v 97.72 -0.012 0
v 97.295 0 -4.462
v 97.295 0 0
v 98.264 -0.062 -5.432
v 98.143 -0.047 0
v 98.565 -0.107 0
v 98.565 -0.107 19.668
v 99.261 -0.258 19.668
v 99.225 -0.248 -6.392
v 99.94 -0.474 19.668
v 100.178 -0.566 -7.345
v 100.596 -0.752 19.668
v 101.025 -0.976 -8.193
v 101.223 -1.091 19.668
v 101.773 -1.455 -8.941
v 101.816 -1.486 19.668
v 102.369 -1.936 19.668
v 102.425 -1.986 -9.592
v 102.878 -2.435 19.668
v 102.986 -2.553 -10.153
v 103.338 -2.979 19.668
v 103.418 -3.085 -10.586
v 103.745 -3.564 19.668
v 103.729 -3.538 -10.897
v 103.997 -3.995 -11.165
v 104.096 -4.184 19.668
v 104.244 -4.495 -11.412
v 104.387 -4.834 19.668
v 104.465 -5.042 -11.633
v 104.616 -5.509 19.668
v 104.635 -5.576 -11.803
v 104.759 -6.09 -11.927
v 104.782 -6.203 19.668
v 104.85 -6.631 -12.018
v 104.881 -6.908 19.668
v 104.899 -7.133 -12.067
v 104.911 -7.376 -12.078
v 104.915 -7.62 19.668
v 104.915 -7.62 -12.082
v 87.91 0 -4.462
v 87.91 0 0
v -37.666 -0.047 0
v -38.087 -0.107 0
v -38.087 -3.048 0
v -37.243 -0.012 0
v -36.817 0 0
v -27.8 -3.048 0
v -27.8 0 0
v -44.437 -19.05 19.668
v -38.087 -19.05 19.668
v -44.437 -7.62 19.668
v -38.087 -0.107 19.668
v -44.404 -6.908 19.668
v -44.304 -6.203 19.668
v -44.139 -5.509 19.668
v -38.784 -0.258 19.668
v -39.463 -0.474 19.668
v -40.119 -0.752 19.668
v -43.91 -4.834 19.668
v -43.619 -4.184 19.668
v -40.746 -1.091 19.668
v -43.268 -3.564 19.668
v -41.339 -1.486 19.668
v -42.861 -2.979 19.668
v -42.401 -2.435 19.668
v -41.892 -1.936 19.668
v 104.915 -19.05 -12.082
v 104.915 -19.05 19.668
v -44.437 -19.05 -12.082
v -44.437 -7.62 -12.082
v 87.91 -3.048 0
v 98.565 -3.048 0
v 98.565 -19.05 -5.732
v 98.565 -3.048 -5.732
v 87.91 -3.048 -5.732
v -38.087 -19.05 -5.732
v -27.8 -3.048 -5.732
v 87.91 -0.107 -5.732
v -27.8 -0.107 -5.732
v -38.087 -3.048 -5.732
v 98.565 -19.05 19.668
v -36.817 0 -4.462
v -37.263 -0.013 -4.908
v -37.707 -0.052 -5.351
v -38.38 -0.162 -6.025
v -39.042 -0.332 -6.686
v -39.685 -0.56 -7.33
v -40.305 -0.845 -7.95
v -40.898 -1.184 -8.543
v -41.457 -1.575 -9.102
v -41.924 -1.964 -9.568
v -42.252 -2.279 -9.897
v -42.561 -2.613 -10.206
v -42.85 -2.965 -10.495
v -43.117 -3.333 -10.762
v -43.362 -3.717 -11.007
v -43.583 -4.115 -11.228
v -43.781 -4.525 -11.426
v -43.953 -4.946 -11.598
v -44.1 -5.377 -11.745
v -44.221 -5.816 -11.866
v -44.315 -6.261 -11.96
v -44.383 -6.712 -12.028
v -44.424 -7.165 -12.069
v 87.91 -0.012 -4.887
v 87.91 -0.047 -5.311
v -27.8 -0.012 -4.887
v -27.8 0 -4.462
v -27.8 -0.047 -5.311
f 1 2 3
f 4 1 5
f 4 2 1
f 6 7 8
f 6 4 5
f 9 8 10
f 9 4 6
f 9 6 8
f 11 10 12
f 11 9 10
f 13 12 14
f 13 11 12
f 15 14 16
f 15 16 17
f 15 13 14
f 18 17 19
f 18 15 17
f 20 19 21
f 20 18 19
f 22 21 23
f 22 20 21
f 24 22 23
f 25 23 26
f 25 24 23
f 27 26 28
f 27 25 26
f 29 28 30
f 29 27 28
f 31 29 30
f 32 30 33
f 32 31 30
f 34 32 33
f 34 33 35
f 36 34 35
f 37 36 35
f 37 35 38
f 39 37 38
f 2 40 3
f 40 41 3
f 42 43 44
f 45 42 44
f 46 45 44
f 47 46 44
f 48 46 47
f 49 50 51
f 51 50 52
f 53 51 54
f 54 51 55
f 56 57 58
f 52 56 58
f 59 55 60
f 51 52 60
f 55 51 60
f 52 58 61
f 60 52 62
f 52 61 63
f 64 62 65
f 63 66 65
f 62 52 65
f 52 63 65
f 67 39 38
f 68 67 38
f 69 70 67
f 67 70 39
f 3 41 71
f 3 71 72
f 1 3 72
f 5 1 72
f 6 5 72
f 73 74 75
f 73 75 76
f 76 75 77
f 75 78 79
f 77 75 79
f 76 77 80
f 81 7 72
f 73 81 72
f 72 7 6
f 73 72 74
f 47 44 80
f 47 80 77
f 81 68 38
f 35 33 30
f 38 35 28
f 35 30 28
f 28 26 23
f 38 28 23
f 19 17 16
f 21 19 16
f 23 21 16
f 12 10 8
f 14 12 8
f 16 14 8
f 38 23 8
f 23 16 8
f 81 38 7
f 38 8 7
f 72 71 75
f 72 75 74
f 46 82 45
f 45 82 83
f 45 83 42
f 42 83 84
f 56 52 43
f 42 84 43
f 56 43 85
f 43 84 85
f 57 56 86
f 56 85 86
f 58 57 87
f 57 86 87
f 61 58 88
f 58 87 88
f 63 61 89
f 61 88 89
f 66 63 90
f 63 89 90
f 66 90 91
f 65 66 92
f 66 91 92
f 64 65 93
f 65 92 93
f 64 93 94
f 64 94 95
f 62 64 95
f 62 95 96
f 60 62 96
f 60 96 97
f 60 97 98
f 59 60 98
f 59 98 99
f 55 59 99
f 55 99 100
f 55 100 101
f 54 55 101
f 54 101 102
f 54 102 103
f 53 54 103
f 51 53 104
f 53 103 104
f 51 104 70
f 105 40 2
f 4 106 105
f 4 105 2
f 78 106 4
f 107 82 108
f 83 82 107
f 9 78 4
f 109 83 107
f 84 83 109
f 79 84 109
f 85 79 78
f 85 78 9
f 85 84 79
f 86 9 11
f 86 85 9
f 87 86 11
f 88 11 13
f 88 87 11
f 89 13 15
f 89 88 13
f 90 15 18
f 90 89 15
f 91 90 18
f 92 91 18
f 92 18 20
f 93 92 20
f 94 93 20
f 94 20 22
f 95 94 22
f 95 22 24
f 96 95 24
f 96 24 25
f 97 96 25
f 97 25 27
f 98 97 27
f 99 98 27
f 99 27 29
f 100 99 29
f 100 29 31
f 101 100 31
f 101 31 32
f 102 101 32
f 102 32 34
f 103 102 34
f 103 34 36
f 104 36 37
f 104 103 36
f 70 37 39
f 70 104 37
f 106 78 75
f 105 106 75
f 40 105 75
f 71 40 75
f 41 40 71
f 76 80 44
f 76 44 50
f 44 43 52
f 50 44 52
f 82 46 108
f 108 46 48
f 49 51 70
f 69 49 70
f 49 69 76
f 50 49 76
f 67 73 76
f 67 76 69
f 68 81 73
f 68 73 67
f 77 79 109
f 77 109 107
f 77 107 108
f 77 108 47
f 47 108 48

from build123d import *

# Parameters (mm, degrees)
F1_DEPTH    = 19.05
F2_W        = 10.287
F2_H        = 5.9704589657
F2_W_2      = 10.7644796371
F3_DEPTH    = 3.048
F4_T1_DEPTH = 69.8499994576
F4_T3_DEPTH = 187.4519989152


# Not quite as in the source:
# - a fillet or chamfer that OpenCascade refuses, or shapes differently, is made with other operations: its cross-section is extruded or revolved along the edge and cut away or added


with BuildPart() as f1:
    # F0 (on Front) → F1 (new body)
    with BuildSketch(Plane.XZ):
        Polygon((-38.0874201655, -5.7323638652), (-38.0874201655, 19.6676361348), (-44.4374196231, 19.6676361348), (-44.4374196231, -12.0823633227), (104.9145792921, -12.0823633227), (104.9145792921, 19.6676361348), (98.5645798345, 19.6676361348), (98.5645798345, -5.7323638652), align=None)
    extrude(amount=F1_DEPTH)

    # F2 (on Front) → F3 (join)
    with BuildSketch(Plane.XZ):
        with Locations((-32.9439201655, -2.9852294829)):
            Rectangle(F2_W, F2_H)
        with Locations((93.29213202, -2.9852294829)):
            Rectangle(F2_W_2, F2_H)
    extrude(amount=F3_DEPTH)

    # F4: fillet of radius 7.62 on 3 edges, made by hand

    # F4_s2 → F4_t1 (cut)
    with BuildSketch(Plane.XY.offset(-31.1323633227)):
        with BuildLine():
            ThreePointArc((97.2945792921, 0), (102.6827329647, -2.2318463274), (104.9145792921, -7.62))
            Line((104.9145792921, -7.62), (104.9145792921, 0))
            Line((104.9145792921, 0), (97.2945792921, 0))
        make_face()
        with BuildLine():
            ThreePointArc((-36.8174196231, 0), (-42.2055732958, -2.2318463274), (-44.4374196231, -7.62))
            Line((-44.4374196231, -7.62), (-44.4374196231, 0))
            Line((-44.4374196231, 0), (-36.8174196231, 0))
        make_face()
    extrude(amount=F4_T1_DEPTH, mode=Mode.SUBTRACT)

    # F4_s4 → F4_t3 (cut)
    with BuildSketch(Plane.YZ.offset(-63.4874196231)):
        with BuildLine():
            ThreePointArc((0, -4.4623633227), (-2.2318463274, -9.8505169954), (-7.62, -12.0823633227))
            Line((-7.62, -12.0823633227), (0, -12.0823633227))
            Line((0, -12.0823633227), (0, -4.4623633227))
        make_face()
    extrude(amount=F4_T3_DEPTH, mode=Mode.SUBTRACT)


solid = f1.part
